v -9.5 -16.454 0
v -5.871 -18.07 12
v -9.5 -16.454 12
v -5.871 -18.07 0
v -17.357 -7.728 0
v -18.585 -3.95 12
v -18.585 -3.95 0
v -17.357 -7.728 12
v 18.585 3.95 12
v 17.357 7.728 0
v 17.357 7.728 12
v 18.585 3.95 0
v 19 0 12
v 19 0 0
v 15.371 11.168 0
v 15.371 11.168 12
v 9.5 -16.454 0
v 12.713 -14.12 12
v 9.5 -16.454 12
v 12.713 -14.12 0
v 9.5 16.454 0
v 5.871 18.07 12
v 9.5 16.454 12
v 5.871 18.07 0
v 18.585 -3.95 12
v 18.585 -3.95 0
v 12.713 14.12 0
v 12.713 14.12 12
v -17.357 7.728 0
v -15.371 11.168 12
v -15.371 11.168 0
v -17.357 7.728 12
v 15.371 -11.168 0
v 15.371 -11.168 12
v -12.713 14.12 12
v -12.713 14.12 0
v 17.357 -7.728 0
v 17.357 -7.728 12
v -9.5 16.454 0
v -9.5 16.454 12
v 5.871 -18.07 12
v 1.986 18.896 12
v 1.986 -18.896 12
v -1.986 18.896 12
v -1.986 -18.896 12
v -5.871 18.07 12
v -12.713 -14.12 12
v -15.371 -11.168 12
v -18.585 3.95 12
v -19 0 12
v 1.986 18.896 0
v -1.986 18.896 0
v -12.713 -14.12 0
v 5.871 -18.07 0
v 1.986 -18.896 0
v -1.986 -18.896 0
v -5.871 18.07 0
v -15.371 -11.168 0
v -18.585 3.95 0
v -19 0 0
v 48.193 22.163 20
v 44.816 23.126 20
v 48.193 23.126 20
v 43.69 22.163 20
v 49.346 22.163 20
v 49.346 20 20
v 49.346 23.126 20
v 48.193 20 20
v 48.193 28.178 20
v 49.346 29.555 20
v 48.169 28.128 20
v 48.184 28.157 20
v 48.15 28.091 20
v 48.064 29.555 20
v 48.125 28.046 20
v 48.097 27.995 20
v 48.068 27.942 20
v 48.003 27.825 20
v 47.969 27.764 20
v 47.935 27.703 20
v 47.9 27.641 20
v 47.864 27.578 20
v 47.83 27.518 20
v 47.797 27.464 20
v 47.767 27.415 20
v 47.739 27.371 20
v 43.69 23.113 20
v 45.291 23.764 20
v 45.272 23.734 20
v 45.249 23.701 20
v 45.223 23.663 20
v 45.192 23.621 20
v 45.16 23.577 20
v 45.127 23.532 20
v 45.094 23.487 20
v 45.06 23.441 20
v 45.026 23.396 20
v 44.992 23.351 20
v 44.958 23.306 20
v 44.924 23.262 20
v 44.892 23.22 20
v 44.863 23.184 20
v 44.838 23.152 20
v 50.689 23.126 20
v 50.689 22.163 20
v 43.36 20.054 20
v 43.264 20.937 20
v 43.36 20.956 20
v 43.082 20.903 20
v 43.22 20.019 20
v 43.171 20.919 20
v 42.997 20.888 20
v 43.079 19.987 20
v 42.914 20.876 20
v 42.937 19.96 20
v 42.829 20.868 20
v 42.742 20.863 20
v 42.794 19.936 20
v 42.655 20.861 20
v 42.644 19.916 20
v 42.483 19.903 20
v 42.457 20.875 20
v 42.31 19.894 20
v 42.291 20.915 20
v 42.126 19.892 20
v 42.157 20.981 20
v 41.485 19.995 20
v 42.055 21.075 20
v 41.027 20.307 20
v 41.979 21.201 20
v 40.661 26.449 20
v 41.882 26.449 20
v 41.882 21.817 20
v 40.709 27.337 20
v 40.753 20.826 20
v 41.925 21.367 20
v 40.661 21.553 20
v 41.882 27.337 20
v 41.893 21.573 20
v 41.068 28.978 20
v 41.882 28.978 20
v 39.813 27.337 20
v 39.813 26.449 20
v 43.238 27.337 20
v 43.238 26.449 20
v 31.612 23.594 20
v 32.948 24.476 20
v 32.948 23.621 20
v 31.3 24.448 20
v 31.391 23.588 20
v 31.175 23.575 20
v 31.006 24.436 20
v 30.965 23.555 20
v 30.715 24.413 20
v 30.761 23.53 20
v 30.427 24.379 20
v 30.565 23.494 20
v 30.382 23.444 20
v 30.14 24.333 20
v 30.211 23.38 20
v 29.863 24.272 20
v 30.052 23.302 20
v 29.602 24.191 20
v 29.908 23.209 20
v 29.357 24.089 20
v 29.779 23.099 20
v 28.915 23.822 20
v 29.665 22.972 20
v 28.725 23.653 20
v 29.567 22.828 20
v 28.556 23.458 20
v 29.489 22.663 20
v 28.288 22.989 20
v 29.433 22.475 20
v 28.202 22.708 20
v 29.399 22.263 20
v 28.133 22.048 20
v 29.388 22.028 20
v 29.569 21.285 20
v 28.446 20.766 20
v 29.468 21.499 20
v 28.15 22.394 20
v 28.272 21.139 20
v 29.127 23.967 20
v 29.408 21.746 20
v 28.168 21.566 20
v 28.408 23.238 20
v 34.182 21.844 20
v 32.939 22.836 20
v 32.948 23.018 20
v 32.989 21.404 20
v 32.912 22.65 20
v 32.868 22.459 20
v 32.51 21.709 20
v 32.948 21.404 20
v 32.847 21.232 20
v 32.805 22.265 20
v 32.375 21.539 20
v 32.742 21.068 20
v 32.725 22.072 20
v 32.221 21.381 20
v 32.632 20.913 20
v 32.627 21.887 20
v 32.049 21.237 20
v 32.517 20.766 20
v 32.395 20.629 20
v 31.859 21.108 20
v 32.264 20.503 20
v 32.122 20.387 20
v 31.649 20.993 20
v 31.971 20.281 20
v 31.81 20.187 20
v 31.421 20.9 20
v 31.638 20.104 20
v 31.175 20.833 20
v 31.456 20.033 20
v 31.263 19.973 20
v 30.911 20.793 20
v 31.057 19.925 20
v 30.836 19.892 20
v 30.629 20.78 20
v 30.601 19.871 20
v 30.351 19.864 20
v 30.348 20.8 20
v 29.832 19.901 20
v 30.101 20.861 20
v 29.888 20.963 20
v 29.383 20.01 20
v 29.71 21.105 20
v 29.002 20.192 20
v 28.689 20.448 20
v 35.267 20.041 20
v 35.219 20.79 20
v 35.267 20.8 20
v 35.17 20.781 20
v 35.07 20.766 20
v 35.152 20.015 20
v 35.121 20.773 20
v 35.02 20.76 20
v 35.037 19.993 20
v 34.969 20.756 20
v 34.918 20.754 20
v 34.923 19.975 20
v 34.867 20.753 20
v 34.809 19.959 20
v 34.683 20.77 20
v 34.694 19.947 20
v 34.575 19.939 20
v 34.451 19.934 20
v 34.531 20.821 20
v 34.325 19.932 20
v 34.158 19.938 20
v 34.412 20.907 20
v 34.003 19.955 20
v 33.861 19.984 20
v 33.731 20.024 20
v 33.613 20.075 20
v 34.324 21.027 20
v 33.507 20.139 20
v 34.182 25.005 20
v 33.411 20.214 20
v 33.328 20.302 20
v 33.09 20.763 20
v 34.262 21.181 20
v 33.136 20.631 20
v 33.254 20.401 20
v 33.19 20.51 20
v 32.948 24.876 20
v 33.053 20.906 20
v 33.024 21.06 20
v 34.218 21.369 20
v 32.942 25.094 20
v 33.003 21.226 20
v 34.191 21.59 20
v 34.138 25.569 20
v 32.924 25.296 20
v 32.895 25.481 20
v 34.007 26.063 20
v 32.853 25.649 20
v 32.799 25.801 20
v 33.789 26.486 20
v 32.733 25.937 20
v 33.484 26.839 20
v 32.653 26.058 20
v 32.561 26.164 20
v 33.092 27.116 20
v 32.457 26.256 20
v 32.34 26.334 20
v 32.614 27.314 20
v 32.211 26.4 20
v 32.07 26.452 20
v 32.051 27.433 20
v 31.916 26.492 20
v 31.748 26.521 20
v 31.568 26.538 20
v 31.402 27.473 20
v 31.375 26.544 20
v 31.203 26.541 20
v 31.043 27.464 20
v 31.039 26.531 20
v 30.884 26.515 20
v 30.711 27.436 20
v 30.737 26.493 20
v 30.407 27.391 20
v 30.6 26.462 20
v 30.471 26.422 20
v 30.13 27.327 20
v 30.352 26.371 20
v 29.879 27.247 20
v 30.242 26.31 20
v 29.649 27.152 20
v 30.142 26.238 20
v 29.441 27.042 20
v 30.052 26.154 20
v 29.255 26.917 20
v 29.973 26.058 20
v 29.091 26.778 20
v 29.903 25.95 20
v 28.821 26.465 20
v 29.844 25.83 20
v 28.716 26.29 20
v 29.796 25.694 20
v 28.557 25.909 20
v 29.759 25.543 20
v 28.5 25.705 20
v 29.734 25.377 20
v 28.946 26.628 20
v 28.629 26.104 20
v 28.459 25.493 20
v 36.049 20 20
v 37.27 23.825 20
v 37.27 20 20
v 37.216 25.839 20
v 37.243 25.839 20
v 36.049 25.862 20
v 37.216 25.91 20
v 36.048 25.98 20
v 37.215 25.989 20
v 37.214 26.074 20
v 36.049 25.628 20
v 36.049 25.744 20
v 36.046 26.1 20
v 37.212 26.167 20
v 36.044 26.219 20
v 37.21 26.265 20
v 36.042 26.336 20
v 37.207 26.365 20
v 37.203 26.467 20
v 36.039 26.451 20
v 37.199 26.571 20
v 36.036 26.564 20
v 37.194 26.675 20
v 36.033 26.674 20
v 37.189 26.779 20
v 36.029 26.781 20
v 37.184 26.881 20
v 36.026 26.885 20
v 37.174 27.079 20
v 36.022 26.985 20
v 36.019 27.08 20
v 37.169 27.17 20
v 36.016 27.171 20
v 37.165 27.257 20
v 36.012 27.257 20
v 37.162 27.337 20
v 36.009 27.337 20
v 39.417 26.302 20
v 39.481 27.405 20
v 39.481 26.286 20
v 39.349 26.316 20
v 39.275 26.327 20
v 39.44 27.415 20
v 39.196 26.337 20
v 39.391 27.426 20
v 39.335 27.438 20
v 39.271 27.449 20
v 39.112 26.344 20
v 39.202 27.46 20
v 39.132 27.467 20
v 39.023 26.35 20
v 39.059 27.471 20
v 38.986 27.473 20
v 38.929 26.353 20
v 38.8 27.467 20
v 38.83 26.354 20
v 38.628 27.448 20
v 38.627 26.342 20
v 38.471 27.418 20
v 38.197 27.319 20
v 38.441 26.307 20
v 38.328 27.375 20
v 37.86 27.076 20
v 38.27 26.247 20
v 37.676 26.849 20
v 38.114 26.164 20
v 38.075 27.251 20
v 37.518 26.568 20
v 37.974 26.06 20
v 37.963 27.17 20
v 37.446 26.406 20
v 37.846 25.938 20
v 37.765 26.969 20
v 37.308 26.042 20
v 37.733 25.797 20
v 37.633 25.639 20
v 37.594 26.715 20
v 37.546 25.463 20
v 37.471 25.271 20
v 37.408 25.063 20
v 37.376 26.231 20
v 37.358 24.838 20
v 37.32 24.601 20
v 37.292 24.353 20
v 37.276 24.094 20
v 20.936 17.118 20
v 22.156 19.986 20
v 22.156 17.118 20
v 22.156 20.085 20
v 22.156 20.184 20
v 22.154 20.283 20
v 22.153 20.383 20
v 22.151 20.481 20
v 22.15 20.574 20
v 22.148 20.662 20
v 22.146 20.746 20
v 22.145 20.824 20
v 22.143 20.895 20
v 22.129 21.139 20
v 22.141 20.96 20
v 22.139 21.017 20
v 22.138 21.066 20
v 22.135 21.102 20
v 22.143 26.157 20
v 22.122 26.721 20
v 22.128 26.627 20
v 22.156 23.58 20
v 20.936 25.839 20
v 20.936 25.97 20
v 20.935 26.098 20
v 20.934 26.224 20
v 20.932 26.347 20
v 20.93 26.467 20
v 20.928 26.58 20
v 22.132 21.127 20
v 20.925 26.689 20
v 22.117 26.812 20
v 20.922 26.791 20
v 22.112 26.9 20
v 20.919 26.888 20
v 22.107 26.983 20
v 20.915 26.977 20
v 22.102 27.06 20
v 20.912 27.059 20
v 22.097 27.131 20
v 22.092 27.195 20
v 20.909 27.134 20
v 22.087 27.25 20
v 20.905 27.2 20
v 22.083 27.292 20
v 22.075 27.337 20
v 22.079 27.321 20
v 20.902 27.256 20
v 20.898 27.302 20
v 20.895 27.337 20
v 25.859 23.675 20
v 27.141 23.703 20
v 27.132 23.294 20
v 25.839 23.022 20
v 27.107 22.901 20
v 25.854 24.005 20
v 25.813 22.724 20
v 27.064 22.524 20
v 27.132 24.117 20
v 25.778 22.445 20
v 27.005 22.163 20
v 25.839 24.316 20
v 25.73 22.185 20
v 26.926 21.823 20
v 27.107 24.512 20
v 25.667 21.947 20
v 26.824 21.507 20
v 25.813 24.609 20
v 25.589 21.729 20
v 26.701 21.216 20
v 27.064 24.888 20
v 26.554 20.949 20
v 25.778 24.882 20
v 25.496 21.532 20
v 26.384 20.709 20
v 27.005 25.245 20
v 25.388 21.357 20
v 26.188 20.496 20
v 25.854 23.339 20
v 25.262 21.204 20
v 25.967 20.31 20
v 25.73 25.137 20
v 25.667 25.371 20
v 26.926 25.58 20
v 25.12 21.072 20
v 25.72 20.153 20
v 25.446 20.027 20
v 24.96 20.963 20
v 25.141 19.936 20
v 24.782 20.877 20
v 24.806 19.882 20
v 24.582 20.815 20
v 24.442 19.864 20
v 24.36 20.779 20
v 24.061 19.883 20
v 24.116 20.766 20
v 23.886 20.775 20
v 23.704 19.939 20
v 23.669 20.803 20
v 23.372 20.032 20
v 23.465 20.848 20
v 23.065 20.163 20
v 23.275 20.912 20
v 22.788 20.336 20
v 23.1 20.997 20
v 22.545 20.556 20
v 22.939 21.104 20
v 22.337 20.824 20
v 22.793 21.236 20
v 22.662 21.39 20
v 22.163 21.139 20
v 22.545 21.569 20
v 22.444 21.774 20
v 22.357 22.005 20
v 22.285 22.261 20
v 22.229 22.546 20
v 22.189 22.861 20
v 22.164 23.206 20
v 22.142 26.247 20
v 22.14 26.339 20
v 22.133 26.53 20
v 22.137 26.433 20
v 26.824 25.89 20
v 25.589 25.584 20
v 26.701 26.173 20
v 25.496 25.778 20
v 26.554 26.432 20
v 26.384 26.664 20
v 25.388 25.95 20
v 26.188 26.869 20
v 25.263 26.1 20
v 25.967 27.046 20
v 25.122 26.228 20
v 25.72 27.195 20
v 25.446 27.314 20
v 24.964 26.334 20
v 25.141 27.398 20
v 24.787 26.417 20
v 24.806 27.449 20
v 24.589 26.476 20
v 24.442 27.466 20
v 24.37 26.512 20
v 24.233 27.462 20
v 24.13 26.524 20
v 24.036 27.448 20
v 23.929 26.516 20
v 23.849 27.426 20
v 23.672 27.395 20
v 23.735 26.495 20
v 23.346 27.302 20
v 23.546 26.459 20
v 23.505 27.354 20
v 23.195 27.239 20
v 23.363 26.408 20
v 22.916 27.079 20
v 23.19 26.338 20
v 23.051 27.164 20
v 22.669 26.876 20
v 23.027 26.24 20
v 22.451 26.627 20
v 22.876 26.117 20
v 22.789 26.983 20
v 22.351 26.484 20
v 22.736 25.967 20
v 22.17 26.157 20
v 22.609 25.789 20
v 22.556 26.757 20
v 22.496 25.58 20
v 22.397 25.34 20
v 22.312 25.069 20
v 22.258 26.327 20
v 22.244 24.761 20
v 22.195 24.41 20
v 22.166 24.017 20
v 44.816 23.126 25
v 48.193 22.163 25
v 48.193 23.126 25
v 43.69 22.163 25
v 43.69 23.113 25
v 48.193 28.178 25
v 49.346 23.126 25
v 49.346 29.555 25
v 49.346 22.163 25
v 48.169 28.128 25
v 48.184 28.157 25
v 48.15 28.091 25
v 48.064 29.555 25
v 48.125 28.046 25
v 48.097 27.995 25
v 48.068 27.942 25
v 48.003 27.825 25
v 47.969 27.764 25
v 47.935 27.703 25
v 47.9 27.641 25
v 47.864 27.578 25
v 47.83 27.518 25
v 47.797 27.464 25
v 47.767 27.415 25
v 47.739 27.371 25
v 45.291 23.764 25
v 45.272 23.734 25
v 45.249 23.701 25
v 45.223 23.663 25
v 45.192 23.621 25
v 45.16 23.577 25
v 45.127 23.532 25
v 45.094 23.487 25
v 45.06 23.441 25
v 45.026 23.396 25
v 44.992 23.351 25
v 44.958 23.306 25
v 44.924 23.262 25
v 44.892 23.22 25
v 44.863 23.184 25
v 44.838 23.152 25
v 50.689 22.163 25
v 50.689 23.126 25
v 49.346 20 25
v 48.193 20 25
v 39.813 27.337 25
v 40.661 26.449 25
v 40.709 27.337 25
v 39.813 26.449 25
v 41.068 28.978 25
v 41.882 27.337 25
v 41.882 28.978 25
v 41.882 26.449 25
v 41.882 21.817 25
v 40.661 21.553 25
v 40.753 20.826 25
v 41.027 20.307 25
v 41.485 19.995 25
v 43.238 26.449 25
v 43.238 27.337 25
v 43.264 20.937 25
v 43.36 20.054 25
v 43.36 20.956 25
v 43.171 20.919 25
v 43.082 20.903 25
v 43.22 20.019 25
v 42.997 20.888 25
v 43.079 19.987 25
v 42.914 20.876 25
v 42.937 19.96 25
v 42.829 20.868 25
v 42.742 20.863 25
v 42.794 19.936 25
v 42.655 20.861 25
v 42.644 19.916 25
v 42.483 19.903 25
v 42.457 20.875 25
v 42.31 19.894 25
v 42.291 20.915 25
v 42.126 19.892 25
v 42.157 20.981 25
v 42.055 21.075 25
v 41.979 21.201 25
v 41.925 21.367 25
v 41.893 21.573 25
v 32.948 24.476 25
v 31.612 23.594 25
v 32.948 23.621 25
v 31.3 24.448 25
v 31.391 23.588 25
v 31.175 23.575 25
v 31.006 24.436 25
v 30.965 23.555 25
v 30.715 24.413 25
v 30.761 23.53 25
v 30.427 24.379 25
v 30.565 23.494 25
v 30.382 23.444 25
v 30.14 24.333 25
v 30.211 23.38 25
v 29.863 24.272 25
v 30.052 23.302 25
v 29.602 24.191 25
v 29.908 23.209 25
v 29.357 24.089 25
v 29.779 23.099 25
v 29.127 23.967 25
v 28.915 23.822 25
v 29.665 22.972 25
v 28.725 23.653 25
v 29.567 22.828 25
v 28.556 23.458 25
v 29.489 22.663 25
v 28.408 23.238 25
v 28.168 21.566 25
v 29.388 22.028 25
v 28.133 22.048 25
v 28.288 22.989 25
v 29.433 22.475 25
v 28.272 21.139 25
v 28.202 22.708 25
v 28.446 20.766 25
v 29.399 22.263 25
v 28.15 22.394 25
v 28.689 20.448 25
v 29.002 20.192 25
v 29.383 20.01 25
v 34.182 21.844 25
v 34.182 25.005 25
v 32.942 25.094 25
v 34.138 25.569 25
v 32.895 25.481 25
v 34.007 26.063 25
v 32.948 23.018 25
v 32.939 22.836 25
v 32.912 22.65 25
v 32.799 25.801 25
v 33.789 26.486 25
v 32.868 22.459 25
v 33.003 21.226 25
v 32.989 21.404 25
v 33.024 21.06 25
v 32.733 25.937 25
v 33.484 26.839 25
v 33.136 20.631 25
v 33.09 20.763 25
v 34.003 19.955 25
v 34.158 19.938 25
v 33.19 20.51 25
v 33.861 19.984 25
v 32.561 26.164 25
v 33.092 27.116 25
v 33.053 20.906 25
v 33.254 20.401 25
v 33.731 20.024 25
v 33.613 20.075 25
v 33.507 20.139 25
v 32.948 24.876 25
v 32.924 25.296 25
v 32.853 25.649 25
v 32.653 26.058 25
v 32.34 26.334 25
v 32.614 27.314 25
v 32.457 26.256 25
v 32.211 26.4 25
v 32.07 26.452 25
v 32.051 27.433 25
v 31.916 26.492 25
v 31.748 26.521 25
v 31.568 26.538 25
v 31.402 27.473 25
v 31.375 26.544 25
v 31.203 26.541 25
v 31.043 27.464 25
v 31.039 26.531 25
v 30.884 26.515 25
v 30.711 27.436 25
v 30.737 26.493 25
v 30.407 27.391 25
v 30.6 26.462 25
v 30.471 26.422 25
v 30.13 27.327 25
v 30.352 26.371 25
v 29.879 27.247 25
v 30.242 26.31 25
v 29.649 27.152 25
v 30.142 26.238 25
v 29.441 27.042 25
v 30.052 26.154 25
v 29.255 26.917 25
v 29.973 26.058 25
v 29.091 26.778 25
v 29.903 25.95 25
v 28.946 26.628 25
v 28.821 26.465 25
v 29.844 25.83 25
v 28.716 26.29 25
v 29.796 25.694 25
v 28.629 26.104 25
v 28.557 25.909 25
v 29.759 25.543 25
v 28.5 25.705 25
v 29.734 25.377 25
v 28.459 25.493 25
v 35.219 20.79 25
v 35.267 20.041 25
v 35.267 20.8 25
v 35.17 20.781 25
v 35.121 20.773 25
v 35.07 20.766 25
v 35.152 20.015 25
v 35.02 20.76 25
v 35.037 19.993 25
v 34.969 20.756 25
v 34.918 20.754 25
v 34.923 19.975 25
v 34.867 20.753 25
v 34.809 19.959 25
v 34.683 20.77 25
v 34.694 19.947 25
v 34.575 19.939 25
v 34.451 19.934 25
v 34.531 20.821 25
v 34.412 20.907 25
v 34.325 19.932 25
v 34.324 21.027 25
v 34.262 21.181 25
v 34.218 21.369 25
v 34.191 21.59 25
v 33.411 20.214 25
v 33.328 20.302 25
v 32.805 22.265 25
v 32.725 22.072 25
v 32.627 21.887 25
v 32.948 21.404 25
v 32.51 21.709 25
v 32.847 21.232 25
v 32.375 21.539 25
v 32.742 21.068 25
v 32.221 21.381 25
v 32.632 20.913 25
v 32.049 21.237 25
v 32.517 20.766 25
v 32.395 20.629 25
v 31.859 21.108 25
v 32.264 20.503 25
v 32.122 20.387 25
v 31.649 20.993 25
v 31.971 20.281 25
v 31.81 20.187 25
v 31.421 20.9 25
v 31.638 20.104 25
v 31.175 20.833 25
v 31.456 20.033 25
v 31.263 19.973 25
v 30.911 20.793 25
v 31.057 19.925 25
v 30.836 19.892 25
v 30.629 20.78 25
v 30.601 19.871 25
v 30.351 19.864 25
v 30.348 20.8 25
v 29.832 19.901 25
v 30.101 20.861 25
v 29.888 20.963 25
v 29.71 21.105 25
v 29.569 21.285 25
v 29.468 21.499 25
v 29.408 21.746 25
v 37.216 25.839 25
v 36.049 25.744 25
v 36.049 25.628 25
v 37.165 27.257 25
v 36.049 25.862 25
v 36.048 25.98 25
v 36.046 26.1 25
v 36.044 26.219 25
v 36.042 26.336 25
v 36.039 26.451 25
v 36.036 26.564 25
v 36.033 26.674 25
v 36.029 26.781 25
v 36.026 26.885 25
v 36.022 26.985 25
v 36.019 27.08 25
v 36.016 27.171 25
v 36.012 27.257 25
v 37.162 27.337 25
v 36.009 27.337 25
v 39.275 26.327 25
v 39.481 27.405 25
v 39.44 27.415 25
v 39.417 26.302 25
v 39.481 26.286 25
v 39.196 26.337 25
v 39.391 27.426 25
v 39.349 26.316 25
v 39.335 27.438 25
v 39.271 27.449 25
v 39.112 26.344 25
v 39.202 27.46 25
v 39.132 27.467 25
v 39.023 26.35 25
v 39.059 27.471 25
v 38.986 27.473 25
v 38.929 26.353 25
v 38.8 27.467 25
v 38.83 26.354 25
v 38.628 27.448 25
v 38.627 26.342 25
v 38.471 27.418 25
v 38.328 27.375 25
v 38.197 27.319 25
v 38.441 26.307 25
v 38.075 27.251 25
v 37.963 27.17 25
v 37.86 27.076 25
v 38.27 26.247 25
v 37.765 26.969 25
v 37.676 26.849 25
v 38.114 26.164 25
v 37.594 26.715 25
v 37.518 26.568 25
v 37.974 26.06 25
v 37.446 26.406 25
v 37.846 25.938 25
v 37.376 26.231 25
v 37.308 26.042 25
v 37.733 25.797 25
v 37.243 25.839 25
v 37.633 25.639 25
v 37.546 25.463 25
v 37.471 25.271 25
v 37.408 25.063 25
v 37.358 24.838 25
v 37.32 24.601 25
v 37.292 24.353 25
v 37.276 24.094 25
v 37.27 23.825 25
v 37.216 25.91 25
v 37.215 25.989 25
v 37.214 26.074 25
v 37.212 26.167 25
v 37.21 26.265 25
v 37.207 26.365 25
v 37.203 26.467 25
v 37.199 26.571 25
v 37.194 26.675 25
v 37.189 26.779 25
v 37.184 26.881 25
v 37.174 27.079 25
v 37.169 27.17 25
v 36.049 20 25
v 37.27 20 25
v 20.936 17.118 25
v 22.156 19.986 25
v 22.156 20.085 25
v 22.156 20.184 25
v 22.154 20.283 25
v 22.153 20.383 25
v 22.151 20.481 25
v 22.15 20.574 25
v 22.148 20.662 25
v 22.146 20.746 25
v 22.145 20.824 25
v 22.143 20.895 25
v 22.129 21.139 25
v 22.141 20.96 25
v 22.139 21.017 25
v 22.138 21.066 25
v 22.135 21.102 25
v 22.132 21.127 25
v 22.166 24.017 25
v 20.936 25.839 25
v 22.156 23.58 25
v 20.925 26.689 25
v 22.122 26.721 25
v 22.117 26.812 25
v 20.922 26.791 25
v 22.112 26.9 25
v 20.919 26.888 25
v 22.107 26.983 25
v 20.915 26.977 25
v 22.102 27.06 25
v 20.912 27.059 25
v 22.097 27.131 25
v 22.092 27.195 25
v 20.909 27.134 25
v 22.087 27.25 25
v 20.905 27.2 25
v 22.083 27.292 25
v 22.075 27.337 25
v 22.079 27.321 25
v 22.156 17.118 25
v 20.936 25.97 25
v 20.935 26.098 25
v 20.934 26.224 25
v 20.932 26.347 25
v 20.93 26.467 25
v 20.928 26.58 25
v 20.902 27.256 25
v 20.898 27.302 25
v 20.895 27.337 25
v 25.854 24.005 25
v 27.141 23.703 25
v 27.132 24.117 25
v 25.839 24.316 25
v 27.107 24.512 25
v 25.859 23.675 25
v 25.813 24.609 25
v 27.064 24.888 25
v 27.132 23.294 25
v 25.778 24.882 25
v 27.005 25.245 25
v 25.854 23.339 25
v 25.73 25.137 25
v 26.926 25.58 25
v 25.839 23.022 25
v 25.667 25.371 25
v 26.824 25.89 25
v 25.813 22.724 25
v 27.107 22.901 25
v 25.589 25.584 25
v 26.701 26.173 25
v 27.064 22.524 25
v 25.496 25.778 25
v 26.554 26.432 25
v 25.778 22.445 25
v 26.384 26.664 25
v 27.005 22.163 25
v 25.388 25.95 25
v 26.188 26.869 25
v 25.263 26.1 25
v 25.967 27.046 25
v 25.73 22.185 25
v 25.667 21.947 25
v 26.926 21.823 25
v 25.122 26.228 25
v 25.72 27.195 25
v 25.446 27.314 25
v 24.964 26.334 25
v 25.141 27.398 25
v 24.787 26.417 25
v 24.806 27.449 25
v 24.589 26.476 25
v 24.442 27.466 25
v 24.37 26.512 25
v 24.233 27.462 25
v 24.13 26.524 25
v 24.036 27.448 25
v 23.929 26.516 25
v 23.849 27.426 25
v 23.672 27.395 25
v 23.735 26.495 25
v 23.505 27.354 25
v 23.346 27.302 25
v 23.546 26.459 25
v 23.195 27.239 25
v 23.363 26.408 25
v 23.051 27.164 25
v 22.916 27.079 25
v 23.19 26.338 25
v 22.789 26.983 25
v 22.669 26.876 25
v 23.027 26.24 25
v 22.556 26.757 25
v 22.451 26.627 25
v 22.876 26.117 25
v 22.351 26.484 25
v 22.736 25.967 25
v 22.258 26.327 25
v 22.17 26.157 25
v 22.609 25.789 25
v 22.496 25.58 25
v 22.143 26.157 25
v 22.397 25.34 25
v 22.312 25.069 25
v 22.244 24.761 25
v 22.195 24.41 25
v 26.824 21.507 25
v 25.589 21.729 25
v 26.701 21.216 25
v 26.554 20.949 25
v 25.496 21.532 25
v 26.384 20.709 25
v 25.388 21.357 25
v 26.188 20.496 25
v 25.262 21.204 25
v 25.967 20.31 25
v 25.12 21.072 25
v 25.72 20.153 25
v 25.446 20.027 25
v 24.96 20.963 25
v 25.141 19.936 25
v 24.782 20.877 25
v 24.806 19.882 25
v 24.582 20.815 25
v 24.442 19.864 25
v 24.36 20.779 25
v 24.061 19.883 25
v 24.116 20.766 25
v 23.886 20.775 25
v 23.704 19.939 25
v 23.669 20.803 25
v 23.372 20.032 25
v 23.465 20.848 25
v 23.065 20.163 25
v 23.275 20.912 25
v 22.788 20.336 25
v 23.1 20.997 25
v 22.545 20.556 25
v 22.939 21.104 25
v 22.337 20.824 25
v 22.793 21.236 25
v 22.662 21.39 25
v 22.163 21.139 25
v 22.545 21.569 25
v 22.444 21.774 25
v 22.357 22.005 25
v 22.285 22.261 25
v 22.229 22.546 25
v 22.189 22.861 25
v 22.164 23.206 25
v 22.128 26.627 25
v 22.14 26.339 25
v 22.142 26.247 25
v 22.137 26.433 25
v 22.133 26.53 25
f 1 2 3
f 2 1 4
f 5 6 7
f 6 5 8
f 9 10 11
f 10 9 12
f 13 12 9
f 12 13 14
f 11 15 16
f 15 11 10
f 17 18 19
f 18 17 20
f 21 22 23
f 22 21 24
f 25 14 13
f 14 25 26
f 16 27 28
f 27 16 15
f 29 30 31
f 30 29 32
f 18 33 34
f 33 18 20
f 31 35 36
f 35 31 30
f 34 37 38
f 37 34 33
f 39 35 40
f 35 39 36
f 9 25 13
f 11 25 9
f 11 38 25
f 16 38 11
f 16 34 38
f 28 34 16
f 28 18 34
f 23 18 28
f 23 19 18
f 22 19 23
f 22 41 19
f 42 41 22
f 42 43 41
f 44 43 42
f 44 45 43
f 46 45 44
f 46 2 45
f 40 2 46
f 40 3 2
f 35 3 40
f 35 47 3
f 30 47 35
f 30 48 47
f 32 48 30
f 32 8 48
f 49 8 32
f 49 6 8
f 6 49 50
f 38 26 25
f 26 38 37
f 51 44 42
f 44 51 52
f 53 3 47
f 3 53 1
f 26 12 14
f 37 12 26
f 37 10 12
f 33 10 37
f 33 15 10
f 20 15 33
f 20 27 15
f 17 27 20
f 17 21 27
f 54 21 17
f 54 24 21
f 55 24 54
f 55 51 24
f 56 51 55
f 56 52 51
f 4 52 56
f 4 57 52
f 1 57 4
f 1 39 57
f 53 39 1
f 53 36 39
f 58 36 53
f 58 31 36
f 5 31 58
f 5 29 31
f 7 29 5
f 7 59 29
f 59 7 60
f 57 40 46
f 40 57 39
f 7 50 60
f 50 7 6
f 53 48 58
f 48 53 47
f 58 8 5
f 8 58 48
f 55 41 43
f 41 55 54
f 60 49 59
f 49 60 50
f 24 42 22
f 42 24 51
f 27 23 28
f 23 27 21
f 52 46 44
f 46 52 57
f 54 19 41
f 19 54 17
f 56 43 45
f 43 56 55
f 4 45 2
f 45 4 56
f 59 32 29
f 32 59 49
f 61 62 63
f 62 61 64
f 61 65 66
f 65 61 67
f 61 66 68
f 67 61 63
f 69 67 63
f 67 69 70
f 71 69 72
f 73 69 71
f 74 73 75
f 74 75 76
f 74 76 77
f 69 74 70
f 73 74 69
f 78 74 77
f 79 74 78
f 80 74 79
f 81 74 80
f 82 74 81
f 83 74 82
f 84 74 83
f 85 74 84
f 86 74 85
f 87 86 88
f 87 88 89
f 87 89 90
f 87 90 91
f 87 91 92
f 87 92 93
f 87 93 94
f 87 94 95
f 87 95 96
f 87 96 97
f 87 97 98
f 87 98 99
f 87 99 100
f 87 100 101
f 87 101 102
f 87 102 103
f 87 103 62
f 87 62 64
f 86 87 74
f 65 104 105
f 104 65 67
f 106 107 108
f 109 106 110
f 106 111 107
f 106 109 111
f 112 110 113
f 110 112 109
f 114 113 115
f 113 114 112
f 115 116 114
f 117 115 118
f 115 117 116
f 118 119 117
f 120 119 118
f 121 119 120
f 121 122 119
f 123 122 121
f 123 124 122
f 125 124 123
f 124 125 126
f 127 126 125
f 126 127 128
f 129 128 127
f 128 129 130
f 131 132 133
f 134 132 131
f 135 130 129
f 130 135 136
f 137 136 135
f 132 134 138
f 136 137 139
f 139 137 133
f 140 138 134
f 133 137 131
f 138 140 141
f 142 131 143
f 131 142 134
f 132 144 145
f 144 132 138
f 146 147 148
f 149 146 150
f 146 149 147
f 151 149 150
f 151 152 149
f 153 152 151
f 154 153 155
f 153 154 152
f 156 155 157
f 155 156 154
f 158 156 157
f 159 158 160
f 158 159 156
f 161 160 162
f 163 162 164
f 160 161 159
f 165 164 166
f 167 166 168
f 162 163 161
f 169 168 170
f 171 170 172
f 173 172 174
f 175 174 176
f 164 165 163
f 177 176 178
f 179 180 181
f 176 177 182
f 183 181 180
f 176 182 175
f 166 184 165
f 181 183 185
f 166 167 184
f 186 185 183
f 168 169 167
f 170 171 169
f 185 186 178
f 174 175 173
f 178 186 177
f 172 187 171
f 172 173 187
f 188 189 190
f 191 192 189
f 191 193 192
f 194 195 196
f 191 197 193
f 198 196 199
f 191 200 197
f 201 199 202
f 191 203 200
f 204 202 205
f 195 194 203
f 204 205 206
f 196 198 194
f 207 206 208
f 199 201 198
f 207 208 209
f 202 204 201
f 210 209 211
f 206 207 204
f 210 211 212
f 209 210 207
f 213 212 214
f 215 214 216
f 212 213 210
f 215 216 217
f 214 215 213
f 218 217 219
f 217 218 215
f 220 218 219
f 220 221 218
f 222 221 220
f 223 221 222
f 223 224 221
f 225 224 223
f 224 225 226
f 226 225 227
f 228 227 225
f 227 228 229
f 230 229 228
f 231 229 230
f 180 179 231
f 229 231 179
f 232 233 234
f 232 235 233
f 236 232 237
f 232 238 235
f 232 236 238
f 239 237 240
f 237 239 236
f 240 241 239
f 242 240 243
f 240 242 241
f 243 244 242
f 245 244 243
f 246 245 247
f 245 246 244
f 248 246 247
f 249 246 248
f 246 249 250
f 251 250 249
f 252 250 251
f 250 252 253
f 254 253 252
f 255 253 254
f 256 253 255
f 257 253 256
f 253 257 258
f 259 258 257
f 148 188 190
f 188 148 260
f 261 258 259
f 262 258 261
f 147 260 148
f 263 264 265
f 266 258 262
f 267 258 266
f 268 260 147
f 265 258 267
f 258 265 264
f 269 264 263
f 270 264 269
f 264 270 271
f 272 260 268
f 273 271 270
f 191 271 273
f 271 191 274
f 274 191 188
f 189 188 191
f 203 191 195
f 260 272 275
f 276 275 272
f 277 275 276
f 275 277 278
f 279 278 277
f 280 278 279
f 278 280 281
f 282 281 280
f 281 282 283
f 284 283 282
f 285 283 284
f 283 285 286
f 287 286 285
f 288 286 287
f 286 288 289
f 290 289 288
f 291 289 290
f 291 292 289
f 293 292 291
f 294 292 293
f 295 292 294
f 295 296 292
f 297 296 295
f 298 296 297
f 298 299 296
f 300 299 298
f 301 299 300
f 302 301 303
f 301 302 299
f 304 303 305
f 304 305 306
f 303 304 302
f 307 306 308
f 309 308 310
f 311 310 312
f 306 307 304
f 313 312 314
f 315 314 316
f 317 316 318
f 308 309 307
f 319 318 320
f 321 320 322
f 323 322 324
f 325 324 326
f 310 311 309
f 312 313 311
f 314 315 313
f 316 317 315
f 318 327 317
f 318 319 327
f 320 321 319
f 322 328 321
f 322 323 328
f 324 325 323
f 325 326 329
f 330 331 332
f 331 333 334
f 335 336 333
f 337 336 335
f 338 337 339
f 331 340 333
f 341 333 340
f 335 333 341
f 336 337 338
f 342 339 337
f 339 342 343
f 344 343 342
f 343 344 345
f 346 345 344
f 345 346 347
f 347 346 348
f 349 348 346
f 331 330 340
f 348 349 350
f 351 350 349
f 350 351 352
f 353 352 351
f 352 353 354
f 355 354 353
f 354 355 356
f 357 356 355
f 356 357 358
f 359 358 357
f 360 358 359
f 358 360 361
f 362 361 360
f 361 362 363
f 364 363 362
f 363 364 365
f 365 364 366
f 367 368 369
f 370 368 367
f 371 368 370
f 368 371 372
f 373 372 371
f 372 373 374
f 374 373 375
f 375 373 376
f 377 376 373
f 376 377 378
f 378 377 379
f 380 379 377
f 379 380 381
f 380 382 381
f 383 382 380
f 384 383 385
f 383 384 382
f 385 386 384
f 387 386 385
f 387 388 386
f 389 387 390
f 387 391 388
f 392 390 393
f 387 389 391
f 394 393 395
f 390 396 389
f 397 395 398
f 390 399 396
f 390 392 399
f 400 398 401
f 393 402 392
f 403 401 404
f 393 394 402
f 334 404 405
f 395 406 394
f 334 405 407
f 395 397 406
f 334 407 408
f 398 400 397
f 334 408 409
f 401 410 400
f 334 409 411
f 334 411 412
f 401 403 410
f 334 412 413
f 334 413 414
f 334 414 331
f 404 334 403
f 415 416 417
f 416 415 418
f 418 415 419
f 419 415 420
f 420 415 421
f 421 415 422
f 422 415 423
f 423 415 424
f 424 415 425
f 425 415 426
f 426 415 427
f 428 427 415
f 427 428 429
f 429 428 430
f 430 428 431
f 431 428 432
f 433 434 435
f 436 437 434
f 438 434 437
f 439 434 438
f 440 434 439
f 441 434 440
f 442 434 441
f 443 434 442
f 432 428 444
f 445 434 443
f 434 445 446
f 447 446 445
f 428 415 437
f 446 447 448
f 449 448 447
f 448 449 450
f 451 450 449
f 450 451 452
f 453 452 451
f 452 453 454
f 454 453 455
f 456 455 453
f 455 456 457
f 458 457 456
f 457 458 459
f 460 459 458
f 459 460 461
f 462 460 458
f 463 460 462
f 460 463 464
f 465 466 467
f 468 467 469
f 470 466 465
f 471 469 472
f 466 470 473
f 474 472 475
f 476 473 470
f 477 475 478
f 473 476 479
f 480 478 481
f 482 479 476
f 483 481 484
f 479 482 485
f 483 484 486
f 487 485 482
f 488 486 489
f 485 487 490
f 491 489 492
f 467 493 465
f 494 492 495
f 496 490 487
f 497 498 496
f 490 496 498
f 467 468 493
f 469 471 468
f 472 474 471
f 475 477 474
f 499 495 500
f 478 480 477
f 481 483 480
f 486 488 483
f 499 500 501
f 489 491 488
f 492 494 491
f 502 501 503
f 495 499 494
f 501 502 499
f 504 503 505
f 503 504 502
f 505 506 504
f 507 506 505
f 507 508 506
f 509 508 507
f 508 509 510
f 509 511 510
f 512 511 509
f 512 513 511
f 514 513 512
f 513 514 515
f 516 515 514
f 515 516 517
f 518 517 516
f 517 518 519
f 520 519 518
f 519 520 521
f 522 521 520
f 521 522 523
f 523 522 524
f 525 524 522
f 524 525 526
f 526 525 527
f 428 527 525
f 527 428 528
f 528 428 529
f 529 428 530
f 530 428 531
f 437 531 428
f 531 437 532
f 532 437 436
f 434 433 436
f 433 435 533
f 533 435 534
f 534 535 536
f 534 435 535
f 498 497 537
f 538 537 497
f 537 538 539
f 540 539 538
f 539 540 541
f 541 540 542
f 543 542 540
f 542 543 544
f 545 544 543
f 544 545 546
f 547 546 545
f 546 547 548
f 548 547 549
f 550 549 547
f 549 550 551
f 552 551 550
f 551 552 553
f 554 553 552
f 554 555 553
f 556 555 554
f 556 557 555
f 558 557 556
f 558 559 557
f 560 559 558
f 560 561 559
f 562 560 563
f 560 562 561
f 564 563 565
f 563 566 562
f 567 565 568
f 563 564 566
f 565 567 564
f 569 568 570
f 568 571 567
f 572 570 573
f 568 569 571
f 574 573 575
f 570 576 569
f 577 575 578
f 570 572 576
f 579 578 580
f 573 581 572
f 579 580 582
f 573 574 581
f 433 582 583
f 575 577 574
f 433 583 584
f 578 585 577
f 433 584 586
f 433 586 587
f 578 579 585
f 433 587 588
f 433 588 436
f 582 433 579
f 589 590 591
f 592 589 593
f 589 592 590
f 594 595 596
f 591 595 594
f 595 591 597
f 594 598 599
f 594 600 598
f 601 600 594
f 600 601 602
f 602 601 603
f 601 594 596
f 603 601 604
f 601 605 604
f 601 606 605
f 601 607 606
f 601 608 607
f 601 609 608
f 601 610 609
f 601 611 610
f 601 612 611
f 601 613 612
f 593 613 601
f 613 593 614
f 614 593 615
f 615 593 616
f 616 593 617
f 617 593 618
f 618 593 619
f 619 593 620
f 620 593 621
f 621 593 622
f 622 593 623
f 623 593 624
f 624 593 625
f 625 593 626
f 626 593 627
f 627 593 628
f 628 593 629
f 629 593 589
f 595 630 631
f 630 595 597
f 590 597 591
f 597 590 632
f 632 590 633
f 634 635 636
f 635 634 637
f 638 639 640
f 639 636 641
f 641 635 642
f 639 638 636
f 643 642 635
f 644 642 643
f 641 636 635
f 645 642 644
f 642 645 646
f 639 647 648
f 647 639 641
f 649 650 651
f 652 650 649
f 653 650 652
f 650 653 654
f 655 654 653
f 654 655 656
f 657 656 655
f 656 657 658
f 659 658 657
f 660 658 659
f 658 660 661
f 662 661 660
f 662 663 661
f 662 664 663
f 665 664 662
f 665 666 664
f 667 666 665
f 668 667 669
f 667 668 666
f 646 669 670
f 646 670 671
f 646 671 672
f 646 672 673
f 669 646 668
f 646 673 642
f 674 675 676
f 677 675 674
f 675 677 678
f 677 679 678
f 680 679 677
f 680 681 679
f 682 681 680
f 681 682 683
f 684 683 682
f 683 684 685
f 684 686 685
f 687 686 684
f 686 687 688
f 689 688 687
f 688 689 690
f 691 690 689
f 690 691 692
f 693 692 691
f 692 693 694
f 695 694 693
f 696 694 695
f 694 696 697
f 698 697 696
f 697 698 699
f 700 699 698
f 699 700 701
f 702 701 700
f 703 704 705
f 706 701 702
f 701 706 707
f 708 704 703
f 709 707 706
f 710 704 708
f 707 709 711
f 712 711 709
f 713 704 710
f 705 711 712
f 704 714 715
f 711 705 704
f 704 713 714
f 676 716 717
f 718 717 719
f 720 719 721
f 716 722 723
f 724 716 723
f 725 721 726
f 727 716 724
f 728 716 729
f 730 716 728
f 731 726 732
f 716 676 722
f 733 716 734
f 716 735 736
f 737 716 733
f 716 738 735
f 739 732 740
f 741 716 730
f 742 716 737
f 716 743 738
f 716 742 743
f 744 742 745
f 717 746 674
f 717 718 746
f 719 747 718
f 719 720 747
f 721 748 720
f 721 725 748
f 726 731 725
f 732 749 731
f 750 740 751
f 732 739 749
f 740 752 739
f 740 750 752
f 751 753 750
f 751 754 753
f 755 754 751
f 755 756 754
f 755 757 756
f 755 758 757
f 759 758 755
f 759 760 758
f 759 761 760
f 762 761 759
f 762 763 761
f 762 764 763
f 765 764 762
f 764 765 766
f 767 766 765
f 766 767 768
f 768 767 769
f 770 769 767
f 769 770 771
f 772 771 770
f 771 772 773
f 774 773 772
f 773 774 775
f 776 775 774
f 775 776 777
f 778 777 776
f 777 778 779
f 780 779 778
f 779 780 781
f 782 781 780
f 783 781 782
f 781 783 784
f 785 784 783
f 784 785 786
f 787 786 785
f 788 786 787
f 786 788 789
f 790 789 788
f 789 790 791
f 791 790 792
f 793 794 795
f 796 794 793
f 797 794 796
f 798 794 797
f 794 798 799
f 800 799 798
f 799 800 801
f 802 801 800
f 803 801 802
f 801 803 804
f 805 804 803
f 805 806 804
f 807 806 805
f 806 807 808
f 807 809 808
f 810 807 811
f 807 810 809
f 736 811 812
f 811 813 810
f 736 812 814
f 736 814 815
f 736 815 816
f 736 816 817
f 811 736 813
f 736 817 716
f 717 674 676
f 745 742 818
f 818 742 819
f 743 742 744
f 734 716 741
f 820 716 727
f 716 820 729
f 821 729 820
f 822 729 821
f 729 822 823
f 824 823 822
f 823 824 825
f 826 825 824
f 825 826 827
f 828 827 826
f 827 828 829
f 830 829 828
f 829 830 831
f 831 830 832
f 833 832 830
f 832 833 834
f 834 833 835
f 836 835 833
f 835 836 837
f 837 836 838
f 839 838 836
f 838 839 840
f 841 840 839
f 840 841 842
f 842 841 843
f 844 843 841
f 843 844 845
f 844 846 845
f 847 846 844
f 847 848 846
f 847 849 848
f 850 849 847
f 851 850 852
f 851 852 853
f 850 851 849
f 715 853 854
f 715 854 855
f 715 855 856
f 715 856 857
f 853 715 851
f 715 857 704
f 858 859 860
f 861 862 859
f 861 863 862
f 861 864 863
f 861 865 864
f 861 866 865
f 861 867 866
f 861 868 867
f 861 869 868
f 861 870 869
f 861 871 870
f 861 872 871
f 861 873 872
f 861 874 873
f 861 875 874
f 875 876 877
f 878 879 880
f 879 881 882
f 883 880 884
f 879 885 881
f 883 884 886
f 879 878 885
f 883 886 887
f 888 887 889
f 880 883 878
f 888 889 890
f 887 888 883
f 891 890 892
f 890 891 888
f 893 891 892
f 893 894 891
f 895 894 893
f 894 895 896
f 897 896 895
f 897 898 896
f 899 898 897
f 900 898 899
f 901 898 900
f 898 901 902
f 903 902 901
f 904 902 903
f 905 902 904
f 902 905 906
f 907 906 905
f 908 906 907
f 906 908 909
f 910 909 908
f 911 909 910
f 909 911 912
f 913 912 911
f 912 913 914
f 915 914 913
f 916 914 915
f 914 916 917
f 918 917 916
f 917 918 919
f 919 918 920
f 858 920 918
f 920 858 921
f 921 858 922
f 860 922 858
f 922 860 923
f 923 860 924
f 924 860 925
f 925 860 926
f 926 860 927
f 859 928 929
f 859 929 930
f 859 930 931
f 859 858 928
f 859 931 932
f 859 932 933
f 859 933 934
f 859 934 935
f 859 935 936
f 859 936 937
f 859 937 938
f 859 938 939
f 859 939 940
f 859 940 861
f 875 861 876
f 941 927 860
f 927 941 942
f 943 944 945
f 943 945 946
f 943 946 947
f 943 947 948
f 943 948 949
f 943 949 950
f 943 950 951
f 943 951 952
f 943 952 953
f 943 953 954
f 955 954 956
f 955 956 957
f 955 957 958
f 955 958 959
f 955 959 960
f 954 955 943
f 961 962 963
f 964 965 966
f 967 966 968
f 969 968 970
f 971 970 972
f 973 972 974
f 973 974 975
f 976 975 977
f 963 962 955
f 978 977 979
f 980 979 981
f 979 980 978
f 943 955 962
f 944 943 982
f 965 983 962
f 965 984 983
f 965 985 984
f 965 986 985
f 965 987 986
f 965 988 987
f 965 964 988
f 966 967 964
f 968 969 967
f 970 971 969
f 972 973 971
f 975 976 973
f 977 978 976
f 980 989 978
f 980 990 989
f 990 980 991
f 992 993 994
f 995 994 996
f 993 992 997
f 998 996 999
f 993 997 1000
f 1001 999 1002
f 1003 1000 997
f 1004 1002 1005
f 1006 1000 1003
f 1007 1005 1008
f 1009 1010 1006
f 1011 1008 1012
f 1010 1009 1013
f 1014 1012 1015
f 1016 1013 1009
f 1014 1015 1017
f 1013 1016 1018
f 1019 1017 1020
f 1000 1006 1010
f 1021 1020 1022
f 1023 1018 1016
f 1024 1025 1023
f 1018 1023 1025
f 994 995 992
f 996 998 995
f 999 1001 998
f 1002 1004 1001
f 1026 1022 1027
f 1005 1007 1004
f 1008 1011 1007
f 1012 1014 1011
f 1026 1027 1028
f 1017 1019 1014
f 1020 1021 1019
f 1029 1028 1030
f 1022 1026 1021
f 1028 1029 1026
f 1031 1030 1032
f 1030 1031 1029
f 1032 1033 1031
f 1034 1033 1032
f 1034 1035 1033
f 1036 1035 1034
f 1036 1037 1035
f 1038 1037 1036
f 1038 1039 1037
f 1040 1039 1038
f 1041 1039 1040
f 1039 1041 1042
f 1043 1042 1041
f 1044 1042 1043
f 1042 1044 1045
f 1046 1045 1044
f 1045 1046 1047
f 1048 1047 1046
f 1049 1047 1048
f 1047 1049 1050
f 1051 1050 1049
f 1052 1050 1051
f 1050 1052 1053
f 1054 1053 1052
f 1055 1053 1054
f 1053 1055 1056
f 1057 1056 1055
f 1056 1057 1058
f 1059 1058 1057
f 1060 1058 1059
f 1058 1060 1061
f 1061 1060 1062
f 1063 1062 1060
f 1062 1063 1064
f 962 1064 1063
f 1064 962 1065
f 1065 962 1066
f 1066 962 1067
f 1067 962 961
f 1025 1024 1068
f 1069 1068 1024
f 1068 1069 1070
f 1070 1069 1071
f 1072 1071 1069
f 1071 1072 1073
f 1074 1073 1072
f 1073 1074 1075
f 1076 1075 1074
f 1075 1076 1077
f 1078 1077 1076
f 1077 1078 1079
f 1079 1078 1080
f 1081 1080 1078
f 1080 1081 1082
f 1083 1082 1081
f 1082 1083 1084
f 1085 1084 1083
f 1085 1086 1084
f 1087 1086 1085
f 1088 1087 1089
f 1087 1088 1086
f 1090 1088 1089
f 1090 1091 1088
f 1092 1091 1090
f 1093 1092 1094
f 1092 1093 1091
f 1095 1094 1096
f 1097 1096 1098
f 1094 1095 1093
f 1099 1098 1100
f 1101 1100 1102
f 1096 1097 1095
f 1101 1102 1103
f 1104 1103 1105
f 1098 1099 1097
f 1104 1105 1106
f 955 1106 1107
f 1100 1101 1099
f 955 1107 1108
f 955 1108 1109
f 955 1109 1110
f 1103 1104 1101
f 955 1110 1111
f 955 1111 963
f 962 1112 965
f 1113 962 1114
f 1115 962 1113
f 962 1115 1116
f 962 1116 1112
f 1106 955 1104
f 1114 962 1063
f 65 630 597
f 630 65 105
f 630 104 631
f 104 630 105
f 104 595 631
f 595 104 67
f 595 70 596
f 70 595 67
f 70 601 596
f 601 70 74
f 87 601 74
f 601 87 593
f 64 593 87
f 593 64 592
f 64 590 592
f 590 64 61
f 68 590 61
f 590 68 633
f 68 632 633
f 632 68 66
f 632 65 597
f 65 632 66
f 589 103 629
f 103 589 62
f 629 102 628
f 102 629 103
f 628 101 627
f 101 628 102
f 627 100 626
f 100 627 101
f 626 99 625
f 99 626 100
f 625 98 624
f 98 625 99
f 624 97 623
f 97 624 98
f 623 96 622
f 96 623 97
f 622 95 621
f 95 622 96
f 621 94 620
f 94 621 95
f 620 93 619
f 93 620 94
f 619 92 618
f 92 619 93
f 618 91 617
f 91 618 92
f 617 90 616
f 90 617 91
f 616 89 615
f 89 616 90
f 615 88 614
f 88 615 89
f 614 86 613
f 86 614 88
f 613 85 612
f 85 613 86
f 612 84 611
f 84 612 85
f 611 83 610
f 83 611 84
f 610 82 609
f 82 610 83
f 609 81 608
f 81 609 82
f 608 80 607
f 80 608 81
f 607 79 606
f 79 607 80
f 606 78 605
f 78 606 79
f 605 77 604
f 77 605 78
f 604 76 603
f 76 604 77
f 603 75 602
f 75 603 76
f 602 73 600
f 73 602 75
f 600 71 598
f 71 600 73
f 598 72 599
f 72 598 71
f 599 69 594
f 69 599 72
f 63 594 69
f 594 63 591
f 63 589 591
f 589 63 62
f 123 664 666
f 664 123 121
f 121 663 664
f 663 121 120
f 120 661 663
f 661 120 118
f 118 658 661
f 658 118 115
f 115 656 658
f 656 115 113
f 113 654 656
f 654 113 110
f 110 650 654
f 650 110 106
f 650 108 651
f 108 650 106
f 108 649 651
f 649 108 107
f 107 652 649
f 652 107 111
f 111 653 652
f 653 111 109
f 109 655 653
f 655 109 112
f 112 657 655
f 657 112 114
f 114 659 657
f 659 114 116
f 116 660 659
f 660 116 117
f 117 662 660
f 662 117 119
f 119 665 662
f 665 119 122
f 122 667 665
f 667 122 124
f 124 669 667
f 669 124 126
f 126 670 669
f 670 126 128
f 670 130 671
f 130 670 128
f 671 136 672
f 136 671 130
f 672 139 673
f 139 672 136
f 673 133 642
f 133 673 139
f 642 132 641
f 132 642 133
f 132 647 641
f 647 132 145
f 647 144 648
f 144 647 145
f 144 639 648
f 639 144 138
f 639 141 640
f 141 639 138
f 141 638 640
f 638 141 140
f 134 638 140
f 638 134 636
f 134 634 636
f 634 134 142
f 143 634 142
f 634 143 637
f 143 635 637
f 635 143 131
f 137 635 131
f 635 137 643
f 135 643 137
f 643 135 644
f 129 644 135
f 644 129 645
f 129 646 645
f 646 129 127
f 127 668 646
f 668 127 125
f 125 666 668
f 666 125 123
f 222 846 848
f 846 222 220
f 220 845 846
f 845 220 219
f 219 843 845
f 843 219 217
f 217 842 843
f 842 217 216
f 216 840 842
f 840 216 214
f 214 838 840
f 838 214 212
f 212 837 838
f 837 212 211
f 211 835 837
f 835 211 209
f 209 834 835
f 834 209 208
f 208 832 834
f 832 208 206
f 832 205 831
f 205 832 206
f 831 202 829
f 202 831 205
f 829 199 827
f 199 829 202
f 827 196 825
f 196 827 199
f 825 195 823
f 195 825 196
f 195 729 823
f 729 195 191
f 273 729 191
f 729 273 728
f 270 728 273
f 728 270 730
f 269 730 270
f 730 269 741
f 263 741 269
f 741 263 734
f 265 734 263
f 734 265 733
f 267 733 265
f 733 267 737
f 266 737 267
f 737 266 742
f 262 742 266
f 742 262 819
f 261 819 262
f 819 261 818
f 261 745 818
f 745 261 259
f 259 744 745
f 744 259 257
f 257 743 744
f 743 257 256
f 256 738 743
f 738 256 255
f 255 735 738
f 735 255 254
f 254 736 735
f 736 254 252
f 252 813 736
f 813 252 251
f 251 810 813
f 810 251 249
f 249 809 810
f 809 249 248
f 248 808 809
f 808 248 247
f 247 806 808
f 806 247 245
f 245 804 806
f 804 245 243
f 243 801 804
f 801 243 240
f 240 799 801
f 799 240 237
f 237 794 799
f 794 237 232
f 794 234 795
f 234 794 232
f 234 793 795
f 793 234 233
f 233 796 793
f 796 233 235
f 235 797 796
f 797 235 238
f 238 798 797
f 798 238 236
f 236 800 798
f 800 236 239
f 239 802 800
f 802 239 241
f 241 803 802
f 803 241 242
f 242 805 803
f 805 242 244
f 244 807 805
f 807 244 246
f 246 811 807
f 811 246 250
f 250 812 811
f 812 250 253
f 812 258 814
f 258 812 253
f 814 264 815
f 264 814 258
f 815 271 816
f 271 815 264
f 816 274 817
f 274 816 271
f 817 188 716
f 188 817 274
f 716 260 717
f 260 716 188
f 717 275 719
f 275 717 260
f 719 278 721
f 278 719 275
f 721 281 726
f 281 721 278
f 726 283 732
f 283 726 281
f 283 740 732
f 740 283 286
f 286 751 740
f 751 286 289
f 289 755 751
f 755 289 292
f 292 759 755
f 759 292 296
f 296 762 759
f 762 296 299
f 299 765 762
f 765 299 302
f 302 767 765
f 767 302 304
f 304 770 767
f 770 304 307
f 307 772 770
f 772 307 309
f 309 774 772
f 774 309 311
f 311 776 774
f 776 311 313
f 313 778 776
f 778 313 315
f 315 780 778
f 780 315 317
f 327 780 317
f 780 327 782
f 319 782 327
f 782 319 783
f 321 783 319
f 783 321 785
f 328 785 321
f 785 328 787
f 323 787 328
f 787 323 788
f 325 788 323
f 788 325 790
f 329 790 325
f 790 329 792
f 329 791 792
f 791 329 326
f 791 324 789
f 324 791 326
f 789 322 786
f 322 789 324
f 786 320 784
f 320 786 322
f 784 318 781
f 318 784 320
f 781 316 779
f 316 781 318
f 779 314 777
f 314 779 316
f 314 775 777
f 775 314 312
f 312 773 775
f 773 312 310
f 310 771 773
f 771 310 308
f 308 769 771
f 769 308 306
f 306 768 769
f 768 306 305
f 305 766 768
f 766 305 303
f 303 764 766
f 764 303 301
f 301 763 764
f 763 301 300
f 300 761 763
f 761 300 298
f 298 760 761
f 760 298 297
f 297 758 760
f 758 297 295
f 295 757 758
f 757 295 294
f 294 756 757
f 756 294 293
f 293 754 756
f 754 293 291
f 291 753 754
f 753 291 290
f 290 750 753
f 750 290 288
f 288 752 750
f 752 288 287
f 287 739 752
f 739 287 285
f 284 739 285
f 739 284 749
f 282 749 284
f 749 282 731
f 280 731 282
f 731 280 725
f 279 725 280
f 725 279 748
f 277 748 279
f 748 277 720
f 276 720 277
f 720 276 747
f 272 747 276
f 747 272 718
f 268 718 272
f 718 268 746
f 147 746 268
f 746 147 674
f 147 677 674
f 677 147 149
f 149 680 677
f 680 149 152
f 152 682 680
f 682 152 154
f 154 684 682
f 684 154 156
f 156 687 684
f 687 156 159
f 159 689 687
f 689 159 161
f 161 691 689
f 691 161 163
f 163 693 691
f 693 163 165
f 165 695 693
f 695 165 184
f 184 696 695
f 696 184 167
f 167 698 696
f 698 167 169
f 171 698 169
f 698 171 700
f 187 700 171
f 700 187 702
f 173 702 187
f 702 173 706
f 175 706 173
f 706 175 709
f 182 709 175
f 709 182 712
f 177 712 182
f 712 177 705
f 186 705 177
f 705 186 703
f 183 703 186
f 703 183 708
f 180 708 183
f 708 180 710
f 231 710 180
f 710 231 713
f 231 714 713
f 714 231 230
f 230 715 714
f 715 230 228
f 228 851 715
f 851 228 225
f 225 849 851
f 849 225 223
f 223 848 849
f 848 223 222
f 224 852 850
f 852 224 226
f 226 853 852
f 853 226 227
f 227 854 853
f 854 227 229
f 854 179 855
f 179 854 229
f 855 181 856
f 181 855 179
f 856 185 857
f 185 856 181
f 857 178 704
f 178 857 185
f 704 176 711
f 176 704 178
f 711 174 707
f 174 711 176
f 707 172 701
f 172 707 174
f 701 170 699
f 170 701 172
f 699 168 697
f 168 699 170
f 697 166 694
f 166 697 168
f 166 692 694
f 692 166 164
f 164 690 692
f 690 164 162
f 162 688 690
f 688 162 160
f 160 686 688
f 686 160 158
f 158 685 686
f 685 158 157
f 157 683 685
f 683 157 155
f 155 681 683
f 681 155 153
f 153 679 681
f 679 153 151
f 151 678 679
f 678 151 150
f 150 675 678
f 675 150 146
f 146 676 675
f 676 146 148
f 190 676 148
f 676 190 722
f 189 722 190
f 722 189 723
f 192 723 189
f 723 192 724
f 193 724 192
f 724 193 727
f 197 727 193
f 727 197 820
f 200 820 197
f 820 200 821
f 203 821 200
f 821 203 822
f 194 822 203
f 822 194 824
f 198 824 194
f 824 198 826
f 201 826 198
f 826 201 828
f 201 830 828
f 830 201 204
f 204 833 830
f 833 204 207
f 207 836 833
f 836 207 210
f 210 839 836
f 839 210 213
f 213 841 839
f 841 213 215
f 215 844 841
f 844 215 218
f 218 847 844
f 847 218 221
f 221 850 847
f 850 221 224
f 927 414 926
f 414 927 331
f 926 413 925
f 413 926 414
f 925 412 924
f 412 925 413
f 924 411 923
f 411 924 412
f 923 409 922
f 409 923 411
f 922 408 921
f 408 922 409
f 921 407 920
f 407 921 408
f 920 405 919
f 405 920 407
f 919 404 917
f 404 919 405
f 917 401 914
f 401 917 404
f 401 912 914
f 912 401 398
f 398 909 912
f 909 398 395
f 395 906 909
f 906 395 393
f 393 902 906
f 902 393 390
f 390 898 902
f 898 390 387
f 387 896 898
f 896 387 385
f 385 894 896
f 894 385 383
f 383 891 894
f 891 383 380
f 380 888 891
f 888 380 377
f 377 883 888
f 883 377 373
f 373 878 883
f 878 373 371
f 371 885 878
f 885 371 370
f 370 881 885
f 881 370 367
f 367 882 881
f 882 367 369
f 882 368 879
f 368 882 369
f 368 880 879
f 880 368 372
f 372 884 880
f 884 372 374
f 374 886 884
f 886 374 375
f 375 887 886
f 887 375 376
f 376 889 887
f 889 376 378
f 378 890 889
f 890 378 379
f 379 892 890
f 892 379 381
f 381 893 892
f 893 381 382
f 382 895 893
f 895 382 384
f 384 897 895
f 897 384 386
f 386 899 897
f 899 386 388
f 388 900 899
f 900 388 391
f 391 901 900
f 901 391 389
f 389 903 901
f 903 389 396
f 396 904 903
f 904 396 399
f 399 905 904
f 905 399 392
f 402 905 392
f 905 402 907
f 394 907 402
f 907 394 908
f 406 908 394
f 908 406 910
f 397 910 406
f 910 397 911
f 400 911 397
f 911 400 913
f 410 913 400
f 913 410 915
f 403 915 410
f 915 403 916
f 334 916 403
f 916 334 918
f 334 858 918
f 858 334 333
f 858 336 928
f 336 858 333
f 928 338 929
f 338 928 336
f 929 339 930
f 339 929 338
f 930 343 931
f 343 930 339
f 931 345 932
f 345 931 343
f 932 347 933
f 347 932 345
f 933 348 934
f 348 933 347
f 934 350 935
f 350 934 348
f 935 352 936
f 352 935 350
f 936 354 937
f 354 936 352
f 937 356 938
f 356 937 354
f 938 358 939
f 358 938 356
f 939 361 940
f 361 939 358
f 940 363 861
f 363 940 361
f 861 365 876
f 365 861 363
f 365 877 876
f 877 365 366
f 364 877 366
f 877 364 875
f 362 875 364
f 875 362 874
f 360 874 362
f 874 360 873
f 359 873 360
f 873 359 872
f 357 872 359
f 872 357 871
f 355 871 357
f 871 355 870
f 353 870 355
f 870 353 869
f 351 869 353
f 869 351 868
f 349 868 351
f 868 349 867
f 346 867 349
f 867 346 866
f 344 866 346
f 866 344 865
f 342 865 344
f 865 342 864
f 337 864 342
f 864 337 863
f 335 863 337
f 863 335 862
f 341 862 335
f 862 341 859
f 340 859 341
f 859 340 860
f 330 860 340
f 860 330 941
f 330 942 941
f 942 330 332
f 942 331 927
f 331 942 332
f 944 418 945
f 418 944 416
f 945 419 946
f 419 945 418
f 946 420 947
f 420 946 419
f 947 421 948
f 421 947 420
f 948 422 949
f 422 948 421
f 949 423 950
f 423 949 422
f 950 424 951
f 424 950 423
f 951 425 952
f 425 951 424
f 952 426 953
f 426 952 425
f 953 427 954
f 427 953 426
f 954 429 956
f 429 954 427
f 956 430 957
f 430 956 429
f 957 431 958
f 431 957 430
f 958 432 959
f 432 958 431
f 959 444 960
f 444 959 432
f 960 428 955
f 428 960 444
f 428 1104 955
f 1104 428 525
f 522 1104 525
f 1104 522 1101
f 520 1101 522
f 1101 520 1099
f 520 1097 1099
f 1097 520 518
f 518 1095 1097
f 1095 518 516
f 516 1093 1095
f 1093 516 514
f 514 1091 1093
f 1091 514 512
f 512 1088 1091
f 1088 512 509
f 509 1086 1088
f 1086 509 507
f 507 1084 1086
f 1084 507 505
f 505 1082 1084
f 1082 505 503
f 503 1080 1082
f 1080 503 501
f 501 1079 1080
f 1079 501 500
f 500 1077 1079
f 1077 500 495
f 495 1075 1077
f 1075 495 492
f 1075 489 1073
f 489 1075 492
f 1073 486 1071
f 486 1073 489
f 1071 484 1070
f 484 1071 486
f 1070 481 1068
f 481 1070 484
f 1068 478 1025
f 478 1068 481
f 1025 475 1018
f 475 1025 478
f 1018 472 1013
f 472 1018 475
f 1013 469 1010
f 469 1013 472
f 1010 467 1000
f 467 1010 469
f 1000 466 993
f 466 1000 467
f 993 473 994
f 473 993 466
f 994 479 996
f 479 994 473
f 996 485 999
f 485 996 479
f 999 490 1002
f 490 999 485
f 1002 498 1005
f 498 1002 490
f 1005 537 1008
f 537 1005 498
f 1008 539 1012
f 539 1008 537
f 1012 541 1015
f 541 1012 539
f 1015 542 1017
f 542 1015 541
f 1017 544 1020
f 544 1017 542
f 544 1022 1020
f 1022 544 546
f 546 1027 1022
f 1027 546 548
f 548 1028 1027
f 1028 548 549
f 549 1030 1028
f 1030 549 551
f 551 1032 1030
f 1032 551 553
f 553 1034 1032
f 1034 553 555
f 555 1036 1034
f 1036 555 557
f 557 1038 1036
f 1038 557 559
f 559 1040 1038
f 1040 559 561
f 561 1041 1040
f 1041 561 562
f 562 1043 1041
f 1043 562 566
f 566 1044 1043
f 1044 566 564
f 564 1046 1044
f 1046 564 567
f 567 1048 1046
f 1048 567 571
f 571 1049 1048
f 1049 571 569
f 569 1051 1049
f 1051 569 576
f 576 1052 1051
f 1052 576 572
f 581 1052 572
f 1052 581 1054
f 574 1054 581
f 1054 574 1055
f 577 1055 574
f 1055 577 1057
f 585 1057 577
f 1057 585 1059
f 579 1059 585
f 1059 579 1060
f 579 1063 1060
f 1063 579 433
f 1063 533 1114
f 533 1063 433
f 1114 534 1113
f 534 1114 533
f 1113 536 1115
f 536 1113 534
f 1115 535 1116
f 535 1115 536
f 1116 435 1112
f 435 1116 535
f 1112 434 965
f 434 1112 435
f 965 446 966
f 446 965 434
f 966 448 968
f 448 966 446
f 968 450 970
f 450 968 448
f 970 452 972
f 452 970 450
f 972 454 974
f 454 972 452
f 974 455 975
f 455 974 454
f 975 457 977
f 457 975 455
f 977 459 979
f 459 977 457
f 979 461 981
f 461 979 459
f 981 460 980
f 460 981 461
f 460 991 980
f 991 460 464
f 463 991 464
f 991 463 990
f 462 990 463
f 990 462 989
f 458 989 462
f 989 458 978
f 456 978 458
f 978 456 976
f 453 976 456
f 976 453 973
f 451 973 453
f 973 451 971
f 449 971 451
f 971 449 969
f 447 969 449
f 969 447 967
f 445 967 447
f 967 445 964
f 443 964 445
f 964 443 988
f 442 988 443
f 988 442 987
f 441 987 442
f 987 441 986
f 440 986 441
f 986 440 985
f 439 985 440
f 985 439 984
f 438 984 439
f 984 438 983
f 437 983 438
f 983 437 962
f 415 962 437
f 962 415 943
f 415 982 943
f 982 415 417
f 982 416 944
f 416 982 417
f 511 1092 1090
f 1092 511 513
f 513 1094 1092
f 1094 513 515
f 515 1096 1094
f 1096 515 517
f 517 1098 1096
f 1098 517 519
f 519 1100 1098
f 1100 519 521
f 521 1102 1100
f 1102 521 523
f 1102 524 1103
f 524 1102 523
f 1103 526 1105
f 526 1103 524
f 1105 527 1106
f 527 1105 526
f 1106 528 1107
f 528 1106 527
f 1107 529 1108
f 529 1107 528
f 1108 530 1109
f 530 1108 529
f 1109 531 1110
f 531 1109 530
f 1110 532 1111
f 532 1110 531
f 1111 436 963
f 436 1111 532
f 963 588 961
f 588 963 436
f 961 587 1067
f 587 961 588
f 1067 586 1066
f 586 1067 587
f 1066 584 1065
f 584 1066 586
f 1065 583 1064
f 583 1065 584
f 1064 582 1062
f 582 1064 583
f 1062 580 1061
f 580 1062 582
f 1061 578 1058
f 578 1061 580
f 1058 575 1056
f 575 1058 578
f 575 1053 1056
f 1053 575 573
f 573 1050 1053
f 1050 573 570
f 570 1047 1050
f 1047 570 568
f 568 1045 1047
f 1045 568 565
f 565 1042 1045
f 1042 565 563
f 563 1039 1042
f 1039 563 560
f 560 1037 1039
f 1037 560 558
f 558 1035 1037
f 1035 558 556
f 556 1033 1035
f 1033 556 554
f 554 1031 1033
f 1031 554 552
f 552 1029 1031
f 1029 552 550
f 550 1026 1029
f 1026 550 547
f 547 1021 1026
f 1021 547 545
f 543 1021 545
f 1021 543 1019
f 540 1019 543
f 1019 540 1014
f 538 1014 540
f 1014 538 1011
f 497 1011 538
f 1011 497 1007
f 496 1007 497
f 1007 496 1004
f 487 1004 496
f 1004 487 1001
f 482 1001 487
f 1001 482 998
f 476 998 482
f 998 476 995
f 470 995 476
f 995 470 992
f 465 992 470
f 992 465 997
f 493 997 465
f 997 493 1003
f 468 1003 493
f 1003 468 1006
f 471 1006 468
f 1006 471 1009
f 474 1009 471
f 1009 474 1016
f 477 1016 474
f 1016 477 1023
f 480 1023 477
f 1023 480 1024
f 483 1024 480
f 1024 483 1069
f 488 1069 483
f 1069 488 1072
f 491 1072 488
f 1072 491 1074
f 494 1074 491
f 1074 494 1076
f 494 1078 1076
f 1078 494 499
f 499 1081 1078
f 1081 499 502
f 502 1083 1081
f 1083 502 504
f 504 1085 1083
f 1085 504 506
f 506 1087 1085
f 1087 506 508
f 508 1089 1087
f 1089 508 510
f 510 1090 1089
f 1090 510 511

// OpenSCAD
//[CUSTOMIZATION]
// Height
h=12;
// Radius
r1=19;
// Message
txt="part4";
module __END_CUSTOMIZATIONS () { }
cylinder(h,r1,r1);
translate([20,20,20]) { linear_extrude(5) text(txt, font="Liberation Sans"); }
